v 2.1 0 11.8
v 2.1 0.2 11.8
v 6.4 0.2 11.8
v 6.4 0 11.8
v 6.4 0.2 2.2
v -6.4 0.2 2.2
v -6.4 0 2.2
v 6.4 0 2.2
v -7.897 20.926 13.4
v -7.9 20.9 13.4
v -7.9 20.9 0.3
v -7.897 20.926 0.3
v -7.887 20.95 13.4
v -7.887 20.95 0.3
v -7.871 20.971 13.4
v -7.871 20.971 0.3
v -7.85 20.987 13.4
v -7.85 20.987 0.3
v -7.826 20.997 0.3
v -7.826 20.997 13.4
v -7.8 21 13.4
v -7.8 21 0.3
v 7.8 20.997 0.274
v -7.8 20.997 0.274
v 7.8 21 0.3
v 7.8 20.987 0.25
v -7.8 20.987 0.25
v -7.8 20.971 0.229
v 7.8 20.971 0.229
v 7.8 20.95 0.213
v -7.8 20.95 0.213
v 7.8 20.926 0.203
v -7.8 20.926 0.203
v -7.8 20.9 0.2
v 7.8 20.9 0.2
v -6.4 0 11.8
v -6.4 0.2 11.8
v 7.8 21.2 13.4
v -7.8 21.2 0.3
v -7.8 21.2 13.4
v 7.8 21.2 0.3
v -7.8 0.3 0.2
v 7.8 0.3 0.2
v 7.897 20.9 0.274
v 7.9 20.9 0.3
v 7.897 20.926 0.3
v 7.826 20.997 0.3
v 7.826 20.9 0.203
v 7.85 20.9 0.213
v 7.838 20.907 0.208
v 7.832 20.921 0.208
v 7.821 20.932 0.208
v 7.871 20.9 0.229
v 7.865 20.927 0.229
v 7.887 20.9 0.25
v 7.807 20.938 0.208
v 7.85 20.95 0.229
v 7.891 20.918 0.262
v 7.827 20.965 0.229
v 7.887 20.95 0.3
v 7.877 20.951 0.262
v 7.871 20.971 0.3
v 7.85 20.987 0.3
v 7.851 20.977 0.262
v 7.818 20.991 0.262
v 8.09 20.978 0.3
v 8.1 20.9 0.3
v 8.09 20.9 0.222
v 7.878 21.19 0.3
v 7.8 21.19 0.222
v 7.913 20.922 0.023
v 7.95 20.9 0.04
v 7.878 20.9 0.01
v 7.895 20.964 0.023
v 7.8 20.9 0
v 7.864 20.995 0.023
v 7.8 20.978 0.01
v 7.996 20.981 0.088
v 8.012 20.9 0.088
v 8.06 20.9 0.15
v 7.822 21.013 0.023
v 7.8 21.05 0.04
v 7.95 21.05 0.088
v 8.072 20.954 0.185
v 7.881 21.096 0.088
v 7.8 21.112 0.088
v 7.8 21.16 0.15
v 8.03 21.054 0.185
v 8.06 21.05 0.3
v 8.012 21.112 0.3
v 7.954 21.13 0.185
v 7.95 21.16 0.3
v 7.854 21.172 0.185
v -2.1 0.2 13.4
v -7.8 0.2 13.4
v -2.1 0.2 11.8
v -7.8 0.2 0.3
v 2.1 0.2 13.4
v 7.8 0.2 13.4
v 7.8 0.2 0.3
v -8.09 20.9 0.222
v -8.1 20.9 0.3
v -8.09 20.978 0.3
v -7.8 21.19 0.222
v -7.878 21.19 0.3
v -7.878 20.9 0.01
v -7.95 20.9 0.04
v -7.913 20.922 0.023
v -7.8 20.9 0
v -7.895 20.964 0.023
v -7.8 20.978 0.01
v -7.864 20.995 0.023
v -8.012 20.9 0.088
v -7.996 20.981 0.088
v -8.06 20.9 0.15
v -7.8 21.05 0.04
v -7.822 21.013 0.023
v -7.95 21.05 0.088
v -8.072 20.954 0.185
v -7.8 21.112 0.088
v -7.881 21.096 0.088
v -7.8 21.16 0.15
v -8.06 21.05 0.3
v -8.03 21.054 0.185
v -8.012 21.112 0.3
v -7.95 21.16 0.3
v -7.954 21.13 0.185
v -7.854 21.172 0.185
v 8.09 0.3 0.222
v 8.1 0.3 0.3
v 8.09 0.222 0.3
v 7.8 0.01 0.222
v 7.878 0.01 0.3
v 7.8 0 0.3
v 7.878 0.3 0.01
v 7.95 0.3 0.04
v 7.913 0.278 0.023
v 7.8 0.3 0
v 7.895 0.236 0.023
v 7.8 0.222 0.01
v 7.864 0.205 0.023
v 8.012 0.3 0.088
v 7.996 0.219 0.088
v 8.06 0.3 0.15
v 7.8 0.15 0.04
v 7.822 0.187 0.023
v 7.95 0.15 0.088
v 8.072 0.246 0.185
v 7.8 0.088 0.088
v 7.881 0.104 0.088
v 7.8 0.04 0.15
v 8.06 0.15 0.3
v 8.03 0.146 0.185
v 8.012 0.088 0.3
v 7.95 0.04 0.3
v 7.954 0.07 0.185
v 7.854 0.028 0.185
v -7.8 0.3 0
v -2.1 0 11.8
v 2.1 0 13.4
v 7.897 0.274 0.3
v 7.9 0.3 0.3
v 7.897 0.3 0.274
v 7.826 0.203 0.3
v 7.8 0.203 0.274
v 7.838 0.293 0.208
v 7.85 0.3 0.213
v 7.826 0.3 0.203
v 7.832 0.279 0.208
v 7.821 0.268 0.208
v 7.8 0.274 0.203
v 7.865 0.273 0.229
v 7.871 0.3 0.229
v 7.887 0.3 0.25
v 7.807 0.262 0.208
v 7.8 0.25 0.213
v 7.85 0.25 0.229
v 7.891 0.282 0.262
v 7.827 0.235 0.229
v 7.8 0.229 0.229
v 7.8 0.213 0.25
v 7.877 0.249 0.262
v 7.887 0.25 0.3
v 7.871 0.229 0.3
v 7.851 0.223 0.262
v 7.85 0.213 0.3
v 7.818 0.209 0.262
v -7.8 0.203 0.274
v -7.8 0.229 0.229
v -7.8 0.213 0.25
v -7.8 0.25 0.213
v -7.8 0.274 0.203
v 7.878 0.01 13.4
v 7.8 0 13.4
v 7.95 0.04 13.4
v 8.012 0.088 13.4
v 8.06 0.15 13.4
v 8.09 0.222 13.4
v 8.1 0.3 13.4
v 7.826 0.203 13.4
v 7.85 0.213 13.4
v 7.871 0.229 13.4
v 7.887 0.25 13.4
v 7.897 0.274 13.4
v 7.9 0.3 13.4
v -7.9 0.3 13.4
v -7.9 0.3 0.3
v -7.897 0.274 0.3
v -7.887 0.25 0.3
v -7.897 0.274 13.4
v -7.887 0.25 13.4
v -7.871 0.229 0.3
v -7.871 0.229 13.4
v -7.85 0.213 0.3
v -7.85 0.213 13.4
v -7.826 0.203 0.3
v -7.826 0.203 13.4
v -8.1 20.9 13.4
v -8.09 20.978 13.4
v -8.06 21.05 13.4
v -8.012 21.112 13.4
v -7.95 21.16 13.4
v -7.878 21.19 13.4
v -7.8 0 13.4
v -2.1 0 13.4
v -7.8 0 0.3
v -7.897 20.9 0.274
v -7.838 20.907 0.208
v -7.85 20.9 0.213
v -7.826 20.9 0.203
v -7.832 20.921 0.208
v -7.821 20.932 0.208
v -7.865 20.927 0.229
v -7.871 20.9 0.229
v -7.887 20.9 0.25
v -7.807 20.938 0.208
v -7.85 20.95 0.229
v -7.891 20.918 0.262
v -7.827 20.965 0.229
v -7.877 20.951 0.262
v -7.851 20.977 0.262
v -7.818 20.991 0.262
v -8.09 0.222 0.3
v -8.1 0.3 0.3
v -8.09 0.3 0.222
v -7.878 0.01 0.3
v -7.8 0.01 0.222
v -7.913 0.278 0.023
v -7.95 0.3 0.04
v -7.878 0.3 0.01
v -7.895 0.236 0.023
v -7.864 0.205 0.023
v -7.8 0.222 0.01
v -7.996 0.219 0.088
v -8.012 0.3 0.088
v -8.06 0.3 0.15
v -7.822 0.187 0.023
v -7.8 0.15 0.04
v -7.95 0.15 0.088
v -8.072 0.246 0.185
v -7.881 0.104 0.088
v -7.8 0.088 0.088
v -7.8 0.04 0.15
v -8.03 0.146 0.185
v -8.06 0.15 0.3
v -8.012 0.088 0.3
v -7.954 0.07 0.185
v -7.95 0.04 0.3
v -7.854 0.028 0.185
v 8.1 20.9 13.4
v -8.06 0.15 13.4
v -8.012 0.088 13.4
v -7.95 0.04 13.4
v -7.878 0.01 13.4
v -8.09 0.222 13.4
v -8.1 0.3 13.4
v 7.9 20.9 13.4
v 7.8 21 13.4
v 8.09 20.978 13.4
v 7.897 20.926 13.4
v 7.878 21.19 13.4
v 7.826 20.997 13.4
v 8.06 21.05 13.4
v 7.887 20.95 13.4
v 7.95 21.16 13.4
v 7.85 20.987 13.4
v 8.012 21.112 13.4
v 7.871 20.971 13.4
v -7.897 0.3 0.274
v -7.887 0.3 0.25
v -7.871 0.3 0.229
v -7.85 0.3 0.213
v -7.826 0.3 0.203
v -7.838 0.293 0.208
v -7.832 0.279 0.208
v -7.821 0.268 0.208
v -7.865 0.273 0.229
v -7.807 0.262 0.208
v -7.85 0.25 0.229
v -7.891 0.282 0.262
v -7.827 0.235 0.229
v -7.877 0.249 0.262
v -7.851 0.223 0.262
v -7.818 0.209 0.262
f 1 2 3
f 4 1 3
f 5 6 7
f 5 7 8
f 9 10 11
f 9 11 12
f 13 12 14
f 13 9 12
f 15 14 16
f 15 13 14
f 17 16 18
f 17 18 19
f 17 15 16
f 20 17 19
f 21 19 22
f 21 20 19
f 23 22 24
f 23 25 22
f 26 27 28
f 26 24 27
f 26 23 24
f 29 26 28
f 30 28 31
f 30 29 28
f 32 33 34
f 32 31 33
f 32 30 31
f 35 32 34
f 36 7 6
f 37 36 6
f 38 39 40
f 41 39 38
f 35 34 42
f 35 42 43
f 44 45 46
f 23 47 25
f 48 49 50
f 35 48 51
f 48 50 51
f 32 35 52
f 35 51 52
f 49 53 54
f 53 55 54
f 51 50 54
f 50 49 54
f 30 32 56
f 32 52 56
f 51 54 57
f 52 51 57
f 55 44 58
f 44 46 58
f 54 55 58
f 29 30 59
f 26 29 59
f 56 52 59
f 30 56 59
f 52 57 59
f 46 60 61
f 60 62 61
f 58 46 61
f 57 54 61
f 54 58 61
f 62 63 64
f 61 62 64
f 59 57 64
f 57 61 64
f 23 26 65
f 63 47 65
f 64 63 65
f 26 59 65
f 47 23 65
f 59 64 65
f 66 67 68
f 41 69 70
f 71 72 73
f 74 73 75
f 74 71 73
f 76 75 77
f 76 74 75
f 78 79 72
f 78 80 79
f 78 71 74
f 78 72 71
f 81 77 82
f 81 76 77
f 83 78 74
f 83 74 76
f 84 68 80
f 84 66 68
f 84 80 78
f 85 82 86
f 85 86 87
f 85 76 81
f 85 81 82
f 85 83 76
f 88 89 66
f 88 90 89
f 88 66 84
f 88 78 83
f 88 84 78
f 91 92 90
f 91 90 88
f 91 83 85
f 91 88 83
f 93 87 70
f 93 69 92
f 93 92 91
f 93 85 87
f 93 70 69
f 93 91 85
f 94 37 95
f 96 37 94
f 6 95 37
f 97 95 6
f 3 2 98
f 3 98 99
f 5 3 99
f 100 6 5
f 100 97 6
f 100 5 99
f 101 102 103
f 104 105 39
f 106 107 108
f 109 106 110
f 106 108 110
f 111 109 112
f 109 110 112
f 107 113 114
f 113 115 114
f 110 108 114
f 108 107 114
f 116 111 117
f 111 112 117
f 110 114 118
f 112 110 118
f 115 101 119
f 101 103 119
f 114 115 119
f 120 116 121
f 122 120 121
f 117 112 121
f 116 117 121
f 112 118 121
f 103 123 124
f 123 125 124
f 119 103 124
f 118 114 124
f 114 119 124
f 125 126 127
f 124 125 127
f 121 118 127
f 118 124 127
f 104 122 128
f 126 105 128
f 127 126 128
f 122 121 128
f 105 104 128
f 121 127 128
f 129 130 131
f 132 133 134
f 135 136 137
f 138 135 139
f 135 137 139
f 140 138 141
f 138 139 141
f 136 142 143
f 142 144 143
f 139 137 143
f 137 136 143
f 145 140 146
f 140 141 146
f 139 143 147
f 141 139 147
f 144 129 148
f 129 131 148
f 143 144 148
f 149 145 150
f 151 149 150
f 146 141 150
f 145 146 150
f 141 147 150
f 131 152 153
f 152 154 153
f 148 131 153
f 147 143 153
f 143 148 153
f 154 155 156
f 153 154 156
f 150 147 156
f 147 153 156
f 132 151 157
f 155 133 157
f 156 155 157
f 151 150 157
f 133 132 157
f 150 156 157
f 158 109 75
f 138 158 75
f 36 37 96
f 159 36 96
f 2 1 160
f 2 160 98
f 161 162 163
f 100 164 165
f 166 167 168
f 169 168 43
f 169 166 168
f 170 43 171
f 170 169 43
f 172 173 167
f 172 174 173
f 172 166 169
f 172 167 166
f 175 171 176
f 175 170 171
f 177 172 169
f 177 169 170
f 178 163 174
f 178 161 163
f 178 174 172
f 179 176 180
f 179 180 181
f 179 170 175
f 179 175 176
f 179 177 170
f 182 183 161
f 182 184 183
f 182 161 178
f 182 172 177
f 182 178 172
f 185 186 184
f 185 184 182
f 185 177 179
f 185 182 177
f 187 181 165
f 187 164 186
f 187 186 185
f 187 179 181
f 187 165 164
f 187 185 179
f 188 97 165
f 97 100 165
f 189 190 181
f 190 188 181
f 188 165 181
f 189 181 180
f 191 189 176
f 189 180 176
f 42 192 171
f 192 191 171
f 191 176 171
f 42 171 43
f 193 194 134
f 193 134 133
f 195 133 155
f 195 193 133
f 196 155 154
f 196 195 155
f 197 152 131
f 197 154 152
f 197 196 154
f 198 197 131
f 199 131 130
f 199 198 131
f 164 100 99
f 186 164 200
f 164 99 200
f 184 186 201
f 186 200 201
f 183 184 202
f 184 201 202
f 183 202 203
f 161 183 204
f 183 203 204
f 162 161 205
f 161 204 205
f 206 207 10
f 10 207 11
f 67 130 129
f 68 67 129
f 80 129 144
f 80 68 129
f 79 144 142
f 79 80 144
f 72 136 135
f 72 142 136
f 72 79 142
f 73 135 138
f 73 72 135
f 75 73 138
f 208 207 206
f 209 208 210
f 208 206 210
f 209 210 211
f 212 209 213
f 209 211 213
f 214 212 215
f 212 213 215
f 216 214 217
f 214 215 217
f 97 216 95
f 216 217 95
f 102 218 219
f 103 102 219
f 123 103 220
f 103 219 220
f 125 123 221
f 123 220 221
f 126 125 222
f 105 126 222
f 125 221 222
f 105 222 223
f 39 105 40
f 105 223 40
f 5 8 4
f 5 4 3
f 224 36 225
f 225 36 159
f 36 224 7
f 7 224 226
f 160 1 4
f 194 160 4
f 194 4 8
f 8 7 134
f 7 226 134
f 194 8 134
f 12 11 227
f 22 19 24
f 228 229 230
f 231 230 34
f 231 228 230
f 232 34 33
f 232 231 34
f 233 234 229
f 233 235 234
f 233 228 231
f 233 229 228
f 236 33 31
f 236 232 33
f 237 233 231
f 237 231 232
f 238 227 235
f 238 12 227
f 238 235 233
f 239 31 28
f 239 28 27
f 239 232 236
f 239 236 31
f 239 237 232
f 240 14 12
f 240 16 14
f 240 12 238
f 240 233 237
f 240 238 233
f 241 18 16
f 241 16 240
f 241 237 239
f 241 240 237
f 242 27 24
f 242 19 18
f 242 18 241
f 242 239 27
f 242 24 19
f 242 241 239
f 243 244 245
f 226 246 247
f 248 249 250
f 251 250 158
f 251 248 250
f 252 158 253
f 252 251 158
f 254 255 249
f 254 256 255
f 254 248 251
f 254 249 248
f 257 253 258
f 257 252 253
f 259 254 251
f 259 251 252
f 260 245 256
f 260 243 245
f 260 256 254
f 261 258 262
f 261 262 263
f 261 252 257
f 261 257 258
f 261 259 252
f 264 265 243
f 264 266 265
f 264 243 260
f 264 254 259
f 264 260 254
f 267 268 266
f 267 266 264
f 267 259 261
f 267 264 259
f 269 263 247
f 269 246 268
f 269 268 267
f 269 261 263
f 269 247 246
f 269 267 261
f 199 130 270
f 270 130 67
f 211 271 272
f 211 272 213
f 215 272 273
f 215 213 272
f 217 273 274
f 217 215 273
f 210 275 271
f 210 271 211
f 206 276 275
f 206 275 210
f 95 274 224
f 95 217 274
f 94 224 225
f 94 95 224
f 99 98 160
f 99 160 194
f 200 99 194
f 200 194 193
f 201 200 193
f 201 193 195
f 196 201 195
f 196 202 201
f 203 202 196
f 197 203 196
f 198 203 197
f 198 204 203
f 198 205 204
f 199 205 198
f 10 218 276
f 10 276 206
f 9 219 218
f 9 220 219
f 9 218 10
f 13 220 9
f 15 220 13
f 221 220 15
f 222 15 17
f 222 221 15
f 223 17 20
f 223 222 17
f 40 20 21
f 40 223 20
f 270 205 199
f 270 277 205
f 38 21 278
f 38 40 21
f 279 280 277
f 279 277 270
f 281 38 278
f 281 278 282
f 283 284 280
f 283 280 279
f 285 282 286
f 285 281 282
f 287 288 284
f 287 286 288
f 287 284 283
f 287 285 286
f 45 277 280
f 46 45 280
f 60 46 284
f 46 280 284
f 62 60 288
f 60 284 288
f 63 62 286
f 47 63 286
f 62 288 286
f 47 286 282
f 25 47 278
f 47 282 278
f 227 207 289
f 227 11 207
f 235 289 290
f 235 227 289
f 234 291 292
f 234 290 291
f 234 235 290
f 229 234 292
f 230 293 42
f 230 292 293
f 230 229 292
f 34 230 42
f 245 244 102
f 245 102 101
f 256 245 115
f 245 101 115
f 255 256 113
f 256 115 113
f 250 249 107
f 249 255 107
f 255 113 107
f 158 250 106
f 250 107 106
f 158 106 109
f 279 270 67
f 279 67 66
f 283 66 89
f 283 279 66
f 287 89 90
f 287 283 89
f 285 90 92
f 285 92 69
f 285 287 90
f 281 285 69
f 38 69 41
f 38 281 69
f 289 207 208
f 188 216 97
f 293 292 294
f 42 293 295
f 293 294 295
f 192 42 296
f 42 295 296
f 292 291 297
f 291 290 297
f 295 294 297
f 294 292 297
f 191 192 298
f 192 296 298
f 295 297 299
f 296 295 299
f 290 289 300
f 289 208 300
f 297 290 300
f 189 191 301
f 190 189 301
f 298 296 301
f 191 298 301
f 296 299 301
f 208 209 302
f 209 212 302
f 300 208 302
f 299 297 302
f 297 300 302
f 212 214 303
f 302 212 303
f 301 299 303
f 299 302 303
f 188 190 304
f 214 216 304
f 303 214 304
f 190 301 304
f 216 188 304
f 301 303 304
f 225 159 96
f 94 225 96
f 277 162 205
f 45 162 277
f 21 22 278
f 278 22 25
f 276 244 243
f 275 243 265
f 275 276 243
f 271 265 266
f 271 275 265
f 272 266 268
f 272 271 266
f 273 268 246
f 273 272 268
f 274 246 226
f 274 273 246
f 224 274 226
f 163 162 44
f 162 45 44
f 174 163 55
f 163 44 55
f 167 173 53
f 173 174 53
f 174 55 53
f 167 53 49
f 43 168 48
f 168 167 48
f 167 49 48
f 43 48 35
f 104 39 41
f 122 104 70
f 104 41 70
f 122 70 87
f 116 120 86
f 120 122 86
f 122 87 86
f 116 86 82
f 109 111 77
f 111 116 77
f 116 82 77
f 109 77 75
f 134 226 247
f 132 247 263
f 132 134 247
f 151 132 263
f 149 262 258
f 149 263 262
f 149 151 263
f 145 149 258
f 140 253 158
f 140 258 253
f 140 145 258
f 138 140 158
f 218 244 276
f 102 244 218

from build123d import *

# Parameters (mm, degrees)
BOX040_W     = 12.8
BOX040_H     = 0.2
BOX040_DEPTH = 9.6
BOX041_W     = 4.2
BOX041_H     = 0.2
BOX041_DEPTH = 1.6
BOX007_W     = 15.8
BOX007_H     = 20.8
BOX007_DEPTH = 13.2
FILLET008_R  = 0.1
BOX039_W     = 16.2
BOX039_H     = 21.2
BOX039_DEPTH = 13.4
FILLET011_R  = 0.3


with BuildPart() as cube032:
    # Box040 → Box040 (new body)
    with BuildSketch(Plane(origin=(-6.4, 0, 2.2), x_dir=(1, 0, 0), z_dir=(0, 0, 1))):
        with Locations((6.4, 0.1)):
            Rectangle(BOX040_W, BOX040_H)
    extrude(amount=BOX040_DEPTH)


with BuildPart() as cube033:
    # Box041 → Box041 (new body)
    with BuildSketch(Plane(origin=(-2.1, 0, 11.8), x_dir=(1, 0, 0), z_dir=(0, 0, 1))):
        with Locations((2.1, 0.1)):
            Rectangle(BOX041_W, BOX041_H)
    extrude(amount=BOX041_DEPTH)


with BuildPart() as fusion042:
    # Box007 → Box007 (new body)
    with BuildSketch(Plane(origin=(-7.9, 0.2, 0.2), x_dir=(1, 0, 0), z_dir=(0, 0, 1))):
        with Locations((7.9, 10.4)):
            Rectangle(BOX007_W, BOX007_H)
    extrude(amount=BOX007_DEPTH)

    # Fillet008
    fillet008_edges = [fusion042.edges().sort_by_distance(p)[0] for p in [
        (-7.9, 0.2, 6.8),
        (-7.9, 21, 6.8),
        (-7.9, 10.6, 0.2),
        (7.9, 0.2, 6.8),
        (7.9, 21, 6.8),
        (7.9, 10.6, 0.2),
        (0, 0.2, 0.2),
        (0, 21, 0.2),
    ]]
    fillet(fillet008_edges, radius=FILLET008_R)

    # Fusion042: union Cube032, Cube033
    add(cube032.part)
    add(cube033.part)


with BuildPart() as shield001:
    # Box039 → Box039 (new body)
    with BuildSketch(Plane(origin=(-8.1, 0, 0), x_dir=(1, 0, 0), z_dir=(0, 0, 1))):
        with Locations((8.1, 10.6)):
            Rectangle(BOX039_W, BOX039_H)
    extrude(amount=BOX039_DEPTH)

    # Fillet011
    fillet011_edges = [shield001.edges().sort_by_distance(p)[0] for p in [
        (-8.1, 0, 6.7),
        (-8.1, 21.2, 6.7),
        (-8.1, 10.6, 0),
        (8.1, 0, 6.7),
        (8.1, 21.2, 6.7),
        (8.1, 10.6, 0),
        (0, 0, 0),
        (0, 21.2, 0),
    ]]
    fillet(fillet011_edges, radius=FILLET011_R)

    # Cut009: cut Fusion042
    add(fusion042.part, mode=Mode.SUBTRACT)


solid = shield001.part
